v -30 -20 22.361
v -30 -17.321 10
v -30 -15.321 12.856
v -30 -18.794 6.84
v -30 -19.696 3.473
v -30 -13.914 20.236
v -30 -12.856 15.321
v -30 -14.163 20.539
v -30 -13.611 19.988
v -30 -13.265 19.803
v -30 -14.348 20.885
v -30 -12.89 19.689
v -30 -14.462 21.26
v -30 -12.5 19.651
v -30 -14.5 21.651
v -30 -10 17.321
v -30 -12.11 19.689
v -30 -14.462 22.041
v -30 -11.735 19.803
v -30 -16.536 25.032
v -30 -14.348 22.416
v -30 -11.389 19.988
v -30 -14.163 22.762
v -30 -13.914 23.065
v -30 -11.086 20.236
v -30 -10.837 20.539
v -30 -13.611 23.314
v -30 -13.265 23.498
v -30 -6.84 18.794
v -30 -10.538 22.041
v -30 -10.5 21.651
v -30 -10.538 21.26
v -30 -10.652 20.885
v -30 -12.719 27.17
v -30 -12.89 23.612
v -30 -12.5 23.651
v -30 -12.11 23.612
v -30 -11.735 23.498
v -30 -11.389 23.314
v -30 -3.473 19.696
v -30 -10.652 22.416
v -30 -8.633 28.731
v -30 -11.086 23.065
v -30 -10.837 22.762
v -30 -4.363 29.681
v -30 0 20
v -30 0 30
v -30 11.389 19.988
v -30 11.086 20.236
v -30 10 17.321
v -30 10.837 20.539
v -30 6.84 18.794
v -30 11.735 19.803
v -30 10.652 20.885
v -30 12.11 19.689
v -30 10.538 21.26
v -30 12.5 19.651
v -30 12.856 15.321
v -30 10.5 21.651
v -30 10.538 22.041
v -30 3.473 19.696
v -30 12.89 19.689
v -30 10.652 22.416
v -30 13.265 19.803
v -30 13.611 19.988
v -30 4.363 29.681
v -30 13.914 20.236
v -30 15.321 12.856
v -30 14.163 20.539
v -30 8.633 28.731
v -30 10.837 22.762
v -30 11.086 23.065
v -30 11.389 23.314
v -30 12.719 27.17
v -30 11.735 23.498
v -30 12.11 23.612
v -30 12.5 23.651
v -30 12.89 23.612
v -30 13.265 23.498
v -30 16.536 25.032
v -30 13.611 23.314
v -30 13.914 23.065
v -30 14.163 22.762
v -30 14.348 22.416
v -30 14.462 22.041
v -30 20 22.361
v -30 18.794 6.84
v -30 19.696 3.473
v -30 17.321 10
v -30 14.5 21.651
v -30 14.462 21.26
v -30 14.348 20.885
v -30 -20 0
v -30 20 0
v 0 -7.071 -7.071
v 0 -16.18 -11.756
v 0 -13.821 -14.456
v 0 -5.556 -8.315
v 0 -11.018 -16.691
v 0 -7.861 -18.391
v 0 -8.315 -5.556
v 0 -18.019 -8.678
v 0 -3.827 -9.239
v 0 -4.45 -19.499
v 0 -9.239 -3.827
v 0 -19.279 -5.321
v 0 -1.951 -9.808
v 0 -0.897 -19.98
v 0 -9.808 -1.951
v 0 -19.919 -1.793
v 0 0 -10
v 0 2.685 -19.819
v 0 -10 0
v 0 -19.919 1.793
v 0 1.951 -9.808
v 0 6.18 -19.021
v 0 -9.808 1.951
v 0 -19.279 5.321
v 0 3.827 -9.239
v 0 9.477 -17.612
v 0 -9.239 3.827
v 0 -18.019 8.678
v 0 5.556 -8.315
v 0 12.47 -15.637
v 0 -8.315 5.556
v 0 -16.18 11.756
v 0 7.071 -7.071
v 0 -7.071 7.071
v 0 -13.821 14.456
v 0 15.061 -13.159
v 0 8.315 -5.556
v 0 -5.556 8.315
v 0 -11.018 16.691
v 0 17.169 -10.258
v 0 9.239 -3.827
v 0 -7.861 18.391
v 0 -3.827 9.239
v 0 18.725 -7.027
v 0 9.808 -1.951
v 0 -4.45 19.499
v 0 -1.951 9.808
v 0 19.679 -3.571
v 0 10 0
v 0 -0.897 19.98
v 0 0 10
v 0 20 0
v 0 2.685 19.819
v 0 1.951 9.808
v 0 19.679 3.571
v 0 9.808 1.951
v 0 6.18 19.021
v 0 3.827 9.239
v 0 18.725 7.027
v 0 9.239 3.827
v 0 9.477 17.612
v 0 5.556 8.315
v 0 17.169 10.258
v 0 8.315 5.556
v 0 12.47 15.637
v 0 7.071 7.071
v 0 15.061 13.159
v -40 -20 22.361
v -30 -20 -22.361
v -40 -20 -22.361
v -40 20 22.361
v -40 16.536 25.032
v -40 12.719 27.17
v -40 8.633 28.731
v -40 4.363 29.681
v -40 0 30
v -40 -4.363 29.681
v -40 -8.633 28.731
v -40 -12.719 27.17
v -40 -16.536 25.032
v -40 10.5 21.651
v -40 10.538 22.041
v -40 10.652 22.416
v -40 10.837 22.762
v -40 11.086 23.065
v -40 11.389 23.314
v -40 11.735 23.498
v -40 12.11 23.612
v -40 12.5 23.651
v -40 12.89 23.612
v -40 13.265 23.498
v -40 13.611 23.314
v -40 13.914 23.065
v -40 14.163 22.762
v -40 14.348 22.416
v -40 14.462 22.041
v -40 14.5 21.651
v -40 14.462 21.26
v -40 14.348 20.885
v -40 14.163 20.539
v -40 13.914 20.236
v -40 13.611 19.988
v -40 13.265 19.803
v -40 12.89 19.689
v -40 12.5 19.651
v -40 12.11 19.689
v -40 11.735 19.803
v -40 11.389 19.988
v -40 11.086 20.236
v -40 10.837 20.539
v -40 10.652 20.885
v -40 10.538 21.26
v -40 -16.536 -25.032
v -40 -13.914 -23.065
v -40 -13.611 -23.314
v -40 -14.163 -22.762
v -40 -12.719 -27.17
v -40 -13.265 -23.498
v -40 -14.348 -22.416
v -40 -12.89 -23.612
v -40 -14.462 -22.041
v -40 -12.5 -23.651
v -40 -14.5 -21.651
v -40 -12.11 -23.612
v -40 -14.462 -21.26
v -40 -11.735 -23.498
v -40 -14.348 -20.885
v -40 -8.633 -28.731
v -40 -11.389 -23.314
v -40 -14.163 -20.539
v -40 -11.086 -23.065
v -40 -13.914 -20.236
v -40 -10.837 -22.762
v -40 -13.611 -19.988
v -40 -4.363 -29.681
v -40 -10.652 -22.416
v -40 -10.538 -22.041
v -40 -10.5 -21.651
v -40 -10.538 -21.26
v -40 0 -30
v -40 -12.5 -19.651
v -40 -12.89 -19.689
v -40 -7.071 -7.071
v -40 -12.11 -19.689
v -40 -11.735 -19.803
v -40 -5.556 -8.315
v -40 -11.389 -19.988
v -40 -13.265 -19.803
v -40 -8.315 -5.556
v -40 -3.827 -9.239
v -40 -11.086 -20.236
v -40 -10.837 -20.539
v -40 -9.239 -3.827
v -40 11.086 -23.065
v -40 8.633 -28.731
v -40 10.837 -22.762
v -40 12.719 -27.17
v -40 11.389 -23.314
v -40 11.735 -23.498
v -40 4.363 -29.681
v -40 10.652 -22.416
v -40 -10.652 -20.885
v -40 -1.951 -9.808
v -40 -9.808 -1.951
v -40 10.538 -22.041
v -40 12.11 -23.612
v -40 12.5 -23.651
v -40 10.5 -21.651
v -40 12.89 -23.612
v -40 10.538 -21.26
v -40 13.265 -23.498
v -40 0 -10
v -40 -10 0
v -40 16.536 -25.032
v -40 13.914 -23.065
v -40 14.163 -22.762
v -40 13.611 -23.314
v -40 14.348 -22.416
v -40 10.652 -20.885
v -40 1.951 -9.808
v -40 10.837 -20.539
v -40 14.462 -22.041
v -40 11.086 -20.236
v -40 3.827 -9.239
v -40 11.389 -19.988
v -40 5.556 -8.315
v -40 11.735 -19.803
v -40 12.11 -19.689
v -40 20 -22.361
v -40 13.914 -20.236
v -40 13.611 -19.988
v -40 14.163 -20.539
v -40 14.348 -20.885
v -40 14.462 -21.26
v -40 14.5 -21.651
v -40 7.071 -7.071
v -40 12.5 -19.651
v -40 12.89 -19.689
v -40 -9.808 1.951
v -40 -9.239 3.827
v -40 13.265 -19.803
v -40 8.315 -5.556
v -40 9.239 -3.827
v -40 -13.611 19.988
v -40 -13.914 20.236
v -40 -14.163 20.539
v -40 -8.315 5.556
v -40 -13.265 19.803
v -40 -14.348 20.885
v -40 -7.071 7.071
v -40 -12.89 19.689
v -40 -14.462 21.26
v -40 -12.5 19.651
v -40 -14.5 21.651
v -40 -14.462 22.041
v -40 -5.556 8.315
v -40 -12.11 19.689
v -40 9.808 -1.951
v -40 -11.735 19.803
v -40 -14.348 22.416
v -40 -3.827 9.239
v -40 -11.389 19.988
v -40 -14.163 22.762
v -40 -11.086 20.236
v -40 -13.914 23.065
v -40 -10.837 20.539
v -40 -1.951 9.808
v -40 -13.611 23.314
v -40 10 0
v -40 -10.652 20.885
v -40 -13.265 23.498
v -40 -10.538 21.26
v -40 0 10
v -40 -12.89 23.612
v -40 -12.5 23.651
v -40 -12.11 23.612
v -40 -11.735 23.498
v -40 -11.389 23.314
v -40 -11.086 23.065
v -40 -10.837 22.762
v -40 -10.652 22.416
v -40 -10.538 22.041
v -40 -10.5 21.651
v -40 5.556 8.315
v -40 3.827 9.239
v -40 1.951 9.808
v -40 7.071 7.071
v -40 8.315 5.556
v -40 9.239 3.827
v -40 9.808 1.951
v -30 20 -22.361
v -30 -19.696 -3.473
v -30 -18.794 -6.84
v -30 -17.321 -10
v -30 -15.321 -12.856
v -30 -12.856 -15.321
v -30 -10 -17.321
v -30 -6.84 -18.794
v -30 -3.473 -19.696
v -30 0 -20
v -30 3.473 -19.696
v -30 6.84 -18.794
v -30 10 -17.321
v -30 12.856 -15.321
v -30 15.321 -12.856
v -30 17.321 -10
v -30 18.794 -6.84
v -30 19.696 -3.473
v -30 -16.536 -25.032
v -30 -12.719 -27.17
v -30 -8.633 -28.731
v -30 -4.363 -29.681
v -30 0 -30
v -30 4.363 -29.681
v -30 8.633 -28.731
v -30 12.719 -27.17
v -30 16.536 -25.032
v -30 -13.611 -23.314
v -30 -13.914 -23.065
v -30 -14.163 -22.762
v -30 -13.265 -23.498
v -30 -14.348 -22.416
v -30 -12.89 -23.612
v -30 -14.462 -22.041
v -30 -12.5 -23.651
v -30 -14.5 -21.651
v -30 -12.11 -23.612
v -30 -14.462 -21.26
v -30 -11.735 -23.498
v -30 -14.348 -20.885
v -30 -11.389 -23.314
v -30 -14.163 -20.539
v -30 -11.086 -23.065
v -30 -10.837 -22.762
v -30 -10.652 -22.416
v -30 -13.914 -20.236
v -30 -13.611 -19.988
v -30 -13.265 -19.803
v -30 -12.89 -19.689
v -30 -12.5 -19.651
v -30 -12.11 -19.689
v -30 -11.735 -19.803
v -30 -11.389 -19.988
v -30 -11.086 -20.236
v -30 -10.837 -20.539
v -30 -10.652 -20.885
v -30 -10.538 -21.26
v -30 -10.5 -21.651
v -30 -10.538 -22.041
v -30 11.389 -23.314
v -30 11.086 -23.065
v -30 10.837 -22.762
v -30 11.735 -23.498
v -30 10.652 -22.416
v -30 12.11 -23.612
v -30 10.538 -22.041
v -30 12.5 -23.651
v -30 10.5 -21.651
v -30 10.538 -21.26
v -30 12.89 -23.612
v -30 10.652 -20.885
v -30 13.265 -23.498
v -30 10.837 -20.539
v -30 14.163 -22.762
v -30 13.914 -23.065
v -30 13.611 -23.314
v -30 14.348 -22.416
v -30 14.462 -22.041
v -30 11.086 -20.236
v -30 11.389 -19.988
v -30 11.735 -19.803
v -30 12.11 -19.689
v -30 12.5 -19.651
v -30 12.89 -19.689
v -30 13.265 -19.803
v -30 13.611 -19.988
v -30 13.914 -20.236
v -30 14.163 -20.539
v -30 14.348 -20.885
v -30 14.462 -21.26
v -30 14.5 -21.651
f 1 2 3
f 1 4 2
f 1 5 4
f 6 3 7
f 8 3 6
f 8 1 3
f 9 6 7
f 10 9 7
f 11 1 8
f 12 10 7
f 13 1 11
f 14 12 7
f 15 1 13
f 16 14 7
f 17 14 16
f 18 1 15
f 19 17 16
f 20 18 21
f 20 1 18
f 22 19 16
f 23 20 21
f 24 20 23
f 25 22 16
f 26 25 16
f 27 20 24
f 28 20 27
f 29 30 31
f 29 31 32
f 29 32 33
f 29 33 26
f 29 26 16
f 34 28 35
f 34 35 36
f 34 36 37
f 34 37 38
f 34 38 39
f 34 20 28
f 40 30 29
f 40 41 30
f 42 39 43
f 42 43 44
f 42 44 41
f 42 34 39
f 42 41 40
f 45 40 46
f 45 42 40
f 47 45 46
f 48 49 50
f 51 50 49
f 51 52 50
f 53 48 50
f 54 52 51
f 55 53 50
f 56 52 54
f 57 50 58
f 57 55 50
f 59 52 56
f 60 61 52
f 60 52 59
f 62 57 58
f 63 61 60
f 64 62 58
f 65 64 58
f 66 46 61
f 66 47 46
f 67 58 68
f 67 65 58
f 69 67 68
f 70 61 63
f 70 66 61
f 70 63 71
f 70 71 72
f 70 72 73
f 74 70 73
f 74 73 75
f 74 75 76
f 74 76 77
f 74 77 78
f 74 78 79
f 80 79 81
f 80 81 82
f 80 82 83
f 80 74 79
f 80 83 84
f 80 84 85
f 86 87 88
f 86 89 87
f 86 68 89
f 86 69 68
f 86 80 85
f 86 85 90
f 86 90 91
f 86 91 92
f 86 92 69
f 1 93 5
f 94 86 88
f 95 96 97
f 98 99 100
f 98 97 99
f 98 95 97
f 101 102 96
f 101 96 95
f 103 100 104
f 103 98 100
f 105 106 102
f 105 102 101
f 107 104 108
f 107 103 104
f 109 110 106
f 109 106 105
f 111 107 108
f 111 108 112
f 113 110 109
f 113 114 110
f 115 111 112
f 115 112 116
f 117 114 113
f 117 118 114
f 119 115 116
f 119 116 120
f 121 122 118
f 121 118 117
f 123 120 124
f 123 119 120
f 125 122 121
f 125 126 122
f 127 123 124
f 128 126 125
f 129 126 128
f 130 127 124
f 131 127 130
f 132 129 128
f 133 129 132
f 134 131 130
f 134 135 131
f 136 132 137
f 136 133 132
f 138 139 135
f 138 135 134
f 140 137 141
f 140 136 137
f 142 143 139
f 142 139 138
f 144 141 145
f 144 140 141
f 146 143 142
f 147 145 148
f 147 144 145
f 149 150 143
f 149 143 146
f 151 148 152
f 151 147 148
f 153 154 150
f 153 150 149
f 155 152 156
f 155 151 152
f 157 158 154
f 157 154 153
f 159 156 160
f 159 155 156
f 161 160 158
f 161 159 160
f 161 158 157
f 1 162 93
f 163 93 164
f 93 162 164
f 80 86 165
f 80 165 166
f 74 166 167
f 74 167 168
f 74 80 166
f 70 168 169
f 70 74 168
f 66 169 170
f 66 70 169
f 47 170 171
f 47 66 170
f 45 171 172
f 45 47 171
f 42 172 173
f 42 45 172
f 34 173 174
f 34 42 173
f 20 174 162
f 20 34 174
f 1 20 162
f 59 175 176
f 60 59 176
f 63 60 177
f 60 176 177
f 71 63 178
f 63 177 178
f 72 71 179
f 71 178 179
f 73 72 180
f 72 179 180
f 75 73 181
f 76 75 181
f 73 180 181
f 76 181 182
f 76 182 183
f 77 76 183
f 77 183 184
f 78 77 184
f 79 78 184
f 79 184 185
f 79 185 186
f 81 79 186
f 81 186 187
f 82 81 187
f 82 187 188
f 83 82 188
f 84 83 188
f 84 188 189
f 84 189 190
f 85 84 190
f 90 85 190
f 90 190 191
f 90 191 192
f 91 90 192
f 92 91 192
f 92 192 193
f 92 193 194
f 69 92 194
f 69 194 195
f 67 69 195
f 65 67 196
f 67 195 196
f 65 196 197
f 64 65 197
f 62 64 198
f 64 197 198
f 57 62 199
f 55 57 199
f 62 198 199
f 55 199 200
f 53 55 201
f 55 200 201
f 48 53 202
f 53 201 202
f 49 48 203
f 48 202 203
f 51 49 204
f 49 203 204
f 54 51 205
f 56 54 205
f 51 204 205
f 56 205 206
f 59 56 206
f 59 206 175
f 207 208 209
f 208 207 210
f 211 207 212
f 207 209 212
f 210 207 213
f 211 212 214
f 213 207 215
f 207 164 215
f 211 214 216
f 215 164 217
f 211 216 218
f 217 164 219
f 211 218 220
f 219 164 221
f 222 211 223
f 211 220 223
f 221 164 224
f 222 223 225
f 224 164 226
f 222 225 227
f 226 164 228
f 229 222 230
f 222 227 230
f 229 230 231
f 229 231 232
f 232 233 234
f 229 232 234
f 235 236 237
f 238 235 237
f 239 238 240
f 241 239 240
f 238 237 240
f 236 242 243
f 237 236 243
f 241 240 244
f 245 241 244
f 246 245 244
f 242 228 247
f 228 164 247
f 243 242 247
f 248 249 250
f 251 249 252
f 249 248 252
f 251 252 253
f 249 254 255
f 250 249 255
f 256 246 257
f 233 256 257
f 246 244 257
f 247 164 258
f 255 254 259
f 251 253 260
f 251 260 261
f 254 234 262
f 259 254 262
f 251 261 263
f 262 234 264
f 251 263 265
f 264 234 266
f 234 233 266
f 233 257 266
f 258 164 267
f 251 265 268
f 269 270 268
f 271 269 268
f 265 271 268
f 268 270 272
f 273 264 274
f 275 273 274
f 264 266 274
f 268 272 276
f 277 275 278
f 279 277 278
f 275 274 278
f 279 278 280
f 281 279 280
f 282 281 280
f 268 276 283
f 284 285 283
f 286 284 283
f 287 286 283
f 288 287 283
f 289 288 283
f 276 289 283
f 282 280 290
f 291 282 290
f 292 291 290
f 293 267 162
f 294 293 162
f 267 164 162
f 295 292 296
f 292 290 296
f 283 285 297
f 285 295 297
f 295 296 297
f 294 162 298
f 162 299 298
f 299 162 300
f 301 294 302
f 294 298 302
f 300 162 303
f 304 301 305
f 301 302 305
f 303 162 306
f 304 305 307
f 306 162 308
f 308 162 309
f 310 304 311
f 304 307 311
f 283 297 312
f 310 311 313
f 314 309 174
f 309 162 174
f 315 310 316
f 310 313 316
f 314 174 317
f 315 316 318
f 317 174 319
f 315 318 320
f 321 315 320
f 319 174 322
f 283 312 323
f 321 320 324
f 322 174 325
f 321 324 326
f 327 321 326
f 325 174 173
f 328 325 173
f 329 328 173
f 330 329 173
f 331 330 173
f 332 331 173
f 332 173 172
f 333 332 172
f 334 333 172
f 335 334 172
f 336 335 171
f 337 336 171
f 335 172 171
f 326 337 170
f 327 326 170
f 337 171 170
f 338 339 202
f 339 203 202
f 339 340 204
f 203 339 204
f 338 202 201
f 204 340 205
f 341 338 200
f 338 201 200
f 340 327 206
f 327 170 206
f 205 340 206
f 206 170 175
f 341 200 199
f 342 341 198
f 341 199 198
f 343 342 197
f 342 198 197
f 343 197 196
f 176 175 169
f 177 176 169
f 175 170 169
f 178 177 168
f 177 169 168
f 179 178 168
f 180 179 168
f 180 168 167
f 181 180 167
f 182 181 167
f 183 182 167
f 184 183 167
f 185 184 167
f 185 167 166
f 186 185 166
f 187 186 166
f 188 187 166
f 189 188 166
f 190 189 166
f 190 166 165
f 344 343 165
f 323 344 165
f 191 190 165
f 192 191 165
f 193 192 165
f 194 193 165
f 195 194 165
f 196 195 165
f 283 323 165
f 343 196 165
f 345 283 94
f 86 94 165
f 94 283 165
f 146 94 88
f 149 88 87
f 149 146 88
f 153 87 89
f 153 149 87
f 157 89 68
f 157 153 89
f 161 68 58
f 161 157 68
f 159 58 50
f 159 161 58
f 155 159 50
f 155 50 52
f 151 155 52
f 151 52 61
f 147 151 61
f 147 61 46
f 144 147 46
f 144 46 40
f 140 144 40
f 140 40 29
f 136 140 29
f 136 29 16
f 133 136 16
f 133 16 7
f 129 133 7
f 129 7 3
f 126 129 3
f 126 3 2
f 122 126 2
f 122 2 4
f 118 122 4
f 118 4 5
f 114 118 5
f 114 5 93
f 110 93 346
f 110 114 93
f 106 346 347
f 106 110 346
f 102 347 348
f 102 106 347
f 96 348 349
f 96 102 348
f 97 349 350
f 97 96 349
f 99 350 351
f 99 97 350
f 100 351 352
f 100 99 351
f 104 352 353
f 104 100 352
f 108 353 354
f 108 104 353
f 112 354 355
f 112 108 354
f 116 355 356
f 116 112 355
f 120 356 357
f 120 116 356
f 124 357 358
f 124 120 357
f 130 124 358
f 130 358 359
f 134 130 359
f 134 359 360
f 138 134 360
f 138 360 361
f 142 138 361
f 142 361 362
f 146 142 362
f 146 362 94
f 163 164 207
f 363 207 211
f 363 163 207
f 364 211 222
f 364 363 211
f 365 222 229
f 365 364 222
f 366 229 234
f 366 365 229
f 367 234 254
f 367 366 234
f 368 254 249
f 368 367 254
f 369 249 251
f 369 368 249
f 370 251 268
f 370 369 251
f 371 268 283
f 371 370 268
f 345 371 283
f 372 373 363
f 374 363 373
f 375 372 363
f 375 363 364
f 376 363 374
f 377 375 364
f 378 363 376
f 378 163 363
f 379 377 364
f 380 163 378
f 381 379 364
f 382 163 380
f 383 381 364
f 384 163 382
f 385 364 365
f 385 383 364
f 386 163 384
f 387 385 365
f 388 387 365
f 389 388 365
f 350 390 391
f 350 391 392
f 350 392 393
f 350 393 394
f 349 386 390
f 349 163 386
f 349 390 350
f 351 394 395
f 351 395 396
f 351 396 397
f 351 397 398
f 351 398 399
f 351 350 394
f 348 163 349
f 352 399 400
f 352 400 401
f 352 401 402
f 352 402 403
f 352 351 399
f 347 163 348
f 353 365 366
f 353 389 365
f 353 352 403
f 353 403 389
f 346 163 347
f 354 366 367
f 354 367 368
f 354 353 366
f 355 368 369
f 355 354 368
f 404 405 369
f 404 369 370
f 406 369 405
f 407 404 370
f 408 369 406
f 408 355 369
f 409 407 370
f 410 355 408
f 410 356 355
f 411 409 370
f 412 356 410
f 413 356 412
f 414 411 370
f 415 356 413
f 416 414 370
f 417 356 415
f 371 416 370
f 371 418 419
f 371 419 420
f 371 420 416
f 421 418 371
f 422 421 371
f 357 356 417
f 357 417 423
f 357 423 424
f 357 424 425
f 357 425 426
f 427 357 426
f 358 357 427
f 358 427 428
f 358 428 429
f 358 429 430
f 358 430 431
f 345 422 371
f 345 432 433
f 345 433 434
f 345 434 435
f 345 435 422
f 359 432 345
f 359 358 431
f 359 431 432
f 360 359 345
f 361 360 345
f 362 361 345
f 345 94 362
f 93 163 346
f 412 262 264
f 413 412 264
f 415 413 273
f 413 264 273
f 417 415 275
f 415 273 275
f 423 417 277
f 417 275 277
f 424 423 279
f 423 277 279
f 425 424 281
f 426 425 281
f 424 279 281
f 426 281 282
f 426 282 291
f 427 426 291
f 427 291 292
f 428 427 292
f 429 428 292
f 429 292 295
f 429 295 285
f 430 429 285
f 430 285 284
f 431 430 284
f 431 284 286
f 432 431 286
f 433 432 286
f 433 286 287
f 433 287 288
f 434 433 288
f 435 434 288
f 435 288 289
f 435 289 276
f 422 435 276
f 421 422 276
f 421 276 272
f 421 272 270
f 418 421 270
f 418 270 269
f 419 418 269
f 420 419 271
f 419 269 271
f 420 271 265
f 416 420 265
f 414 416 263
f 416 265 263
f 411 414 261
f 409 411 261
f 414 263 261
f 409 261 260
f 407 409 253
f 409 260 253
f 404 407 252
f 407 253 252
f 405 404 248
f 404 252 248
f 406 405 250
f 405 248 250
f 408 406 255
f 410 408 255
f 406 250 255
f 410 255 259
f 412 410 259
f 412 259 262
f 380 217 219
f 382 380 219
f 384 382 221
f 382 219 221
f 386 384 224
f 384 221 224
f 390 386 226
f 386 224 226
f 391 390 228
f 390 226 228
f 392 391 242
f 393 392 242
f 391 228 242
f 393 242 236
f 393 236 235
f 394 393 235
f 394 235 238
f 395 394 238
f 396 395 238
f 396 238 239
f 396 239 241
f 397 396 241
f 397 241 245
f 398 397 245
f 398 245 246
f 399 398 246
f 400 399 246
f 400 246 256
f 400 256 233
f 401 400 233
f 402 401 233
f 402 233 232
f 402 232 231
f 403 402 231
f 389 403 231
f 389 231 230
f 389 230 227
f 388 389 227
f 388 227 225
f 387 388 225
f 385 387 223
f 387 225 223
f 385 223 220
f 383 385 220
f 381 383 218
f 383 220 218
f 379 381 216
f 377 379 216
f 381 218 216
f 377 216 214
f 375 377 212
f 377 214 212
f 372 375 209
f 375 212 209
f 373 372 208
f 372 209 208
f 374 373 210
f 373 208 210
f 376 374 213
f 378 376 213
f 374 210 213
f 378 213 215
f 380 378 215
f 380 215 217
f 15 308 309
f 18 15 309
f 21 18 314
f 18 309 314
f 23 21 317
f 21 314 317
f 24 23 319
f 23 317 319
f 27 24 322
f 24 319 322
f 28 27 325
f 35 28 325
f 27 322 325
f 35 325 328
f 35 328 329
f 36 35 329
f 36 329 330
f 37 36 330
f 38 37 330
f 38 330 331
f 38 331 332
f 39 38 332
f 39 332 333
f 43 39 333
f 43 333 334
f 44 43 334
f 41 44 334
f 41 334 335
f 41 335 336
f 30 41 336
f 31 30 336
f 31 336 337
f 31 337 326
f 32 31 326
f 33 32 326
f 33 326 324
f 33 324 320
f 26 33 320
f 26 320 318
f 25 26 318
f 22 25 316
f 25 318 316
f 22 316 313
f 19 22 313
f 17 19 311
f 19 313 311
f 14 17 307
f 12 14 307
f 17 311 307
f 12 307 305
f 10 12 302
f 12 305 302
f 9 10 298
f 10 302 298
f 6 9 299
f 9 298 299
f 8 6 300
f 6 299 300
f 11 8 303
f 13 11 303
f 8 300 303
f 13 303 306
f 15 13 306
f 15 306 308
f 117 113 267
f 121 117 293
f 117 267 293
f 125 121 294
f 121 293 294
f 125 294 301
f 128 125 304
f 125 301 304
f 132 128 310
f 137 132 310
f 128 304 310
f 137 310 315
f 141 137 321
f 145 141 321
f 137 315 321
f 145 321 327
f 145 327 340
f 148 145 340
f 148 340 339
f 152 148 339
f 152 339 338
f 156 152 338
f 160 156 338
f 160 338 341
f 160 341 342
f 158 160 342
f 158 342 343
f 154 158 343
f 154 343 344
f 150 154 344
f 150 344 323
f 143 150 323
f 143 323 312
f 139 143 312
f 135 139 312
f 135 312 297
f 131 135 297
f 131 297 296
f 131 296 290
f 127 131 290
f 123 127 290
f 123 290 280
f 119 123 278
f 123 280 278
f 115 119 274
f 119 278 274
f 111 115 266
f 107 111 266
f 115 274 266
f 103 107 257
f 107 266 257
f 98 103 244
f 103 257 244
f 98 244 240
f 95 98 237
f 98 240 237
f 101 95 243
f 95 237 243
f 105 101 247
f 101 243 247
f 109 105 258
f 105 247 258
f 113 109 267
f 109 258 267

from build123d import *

# Parameters (mm, degrees)
F0_R     = 30
F1_DEPTH = 40
F2_R     = 30
F2_R_2   = 20
F3_DEPTH = 30
F5_DEPTH = 40.001
F6_R     = 2
F7_DEPTH = 40.001
F8_R     = 10
F9_DEPTH = 40.001


with BuildPart() as f1:
    # F0 (on Right) → F1 (new body)
    with BuildSketch(Plane.YZ):
        Circle(F0_R)
    extrude(amount=-F1_DEPTH)

    # F2 (on face) → F3 (cut)
    with BuildSketch(Plane.YZ):
        Circle(F2_R)
        Circle(F2_R_2, mode=Mode.SUBTRACT)
    extrude(amount=-F3_DEPTH, mode=Mode.SUBTRACT)

    # F4 (on face) → F5 (cut, through all)
    with BuildSketch(Plane(origin=(-40, 0, 0), x_dir=(0, -1, 0), z_dir=(-1, 0, 0))):
        with BuildLine():
            Line((-20, -22.36068), (-20, 22.36068))
            ThreePointArc((-20, 22.36068), (-30, 0), (-20, -22.36068))
        make_face()
        with BuildLine():
            ThreePointArc((30, 0), (27.386128, 12.247449), (20, 22.36068))
            Line((20, 22.36068), (20, -22.36068))
            ThreePointArc((20, -22.36068), (27.386128, -12.247449), (30, 0))
        make_face()
    extrude(amount=-F5_DEPTH, mode=Mode.SUBTRACT)

    # F6 (on face) → F7 (cut, through all)
    with BuildSketch(Plane(origin=(-40, 0, 0), x_dir=(0, -1, 0), z_dir=(-1, 0, 0))):
        with Locations((12.5, 21.650635)):
            Circle(F6_R)
        with Locations((-12.5, 21.650635)):
            Circle(F6_R)
        with Locations((12.5, -21.650635)):
            Circle(F6_R)
        with Locations((-12.5, -21.650635)):
            Circle(F6_R)
    extrude(amount=-F7_DEPTH, mode=Mode.SUBTRACT)

    # F8 (on face) → F9 (cut, through all)
    with BuildSketch(Plane(origin=(-40, 0, 0), x_dir=(0, -1, 0), z_dir=(-1, 0, 0))):
        Circle(F8_R)
    extrude(amount=-F9_DEPTH, mode=Mode.SUBTRACT)


solid = f1.part
